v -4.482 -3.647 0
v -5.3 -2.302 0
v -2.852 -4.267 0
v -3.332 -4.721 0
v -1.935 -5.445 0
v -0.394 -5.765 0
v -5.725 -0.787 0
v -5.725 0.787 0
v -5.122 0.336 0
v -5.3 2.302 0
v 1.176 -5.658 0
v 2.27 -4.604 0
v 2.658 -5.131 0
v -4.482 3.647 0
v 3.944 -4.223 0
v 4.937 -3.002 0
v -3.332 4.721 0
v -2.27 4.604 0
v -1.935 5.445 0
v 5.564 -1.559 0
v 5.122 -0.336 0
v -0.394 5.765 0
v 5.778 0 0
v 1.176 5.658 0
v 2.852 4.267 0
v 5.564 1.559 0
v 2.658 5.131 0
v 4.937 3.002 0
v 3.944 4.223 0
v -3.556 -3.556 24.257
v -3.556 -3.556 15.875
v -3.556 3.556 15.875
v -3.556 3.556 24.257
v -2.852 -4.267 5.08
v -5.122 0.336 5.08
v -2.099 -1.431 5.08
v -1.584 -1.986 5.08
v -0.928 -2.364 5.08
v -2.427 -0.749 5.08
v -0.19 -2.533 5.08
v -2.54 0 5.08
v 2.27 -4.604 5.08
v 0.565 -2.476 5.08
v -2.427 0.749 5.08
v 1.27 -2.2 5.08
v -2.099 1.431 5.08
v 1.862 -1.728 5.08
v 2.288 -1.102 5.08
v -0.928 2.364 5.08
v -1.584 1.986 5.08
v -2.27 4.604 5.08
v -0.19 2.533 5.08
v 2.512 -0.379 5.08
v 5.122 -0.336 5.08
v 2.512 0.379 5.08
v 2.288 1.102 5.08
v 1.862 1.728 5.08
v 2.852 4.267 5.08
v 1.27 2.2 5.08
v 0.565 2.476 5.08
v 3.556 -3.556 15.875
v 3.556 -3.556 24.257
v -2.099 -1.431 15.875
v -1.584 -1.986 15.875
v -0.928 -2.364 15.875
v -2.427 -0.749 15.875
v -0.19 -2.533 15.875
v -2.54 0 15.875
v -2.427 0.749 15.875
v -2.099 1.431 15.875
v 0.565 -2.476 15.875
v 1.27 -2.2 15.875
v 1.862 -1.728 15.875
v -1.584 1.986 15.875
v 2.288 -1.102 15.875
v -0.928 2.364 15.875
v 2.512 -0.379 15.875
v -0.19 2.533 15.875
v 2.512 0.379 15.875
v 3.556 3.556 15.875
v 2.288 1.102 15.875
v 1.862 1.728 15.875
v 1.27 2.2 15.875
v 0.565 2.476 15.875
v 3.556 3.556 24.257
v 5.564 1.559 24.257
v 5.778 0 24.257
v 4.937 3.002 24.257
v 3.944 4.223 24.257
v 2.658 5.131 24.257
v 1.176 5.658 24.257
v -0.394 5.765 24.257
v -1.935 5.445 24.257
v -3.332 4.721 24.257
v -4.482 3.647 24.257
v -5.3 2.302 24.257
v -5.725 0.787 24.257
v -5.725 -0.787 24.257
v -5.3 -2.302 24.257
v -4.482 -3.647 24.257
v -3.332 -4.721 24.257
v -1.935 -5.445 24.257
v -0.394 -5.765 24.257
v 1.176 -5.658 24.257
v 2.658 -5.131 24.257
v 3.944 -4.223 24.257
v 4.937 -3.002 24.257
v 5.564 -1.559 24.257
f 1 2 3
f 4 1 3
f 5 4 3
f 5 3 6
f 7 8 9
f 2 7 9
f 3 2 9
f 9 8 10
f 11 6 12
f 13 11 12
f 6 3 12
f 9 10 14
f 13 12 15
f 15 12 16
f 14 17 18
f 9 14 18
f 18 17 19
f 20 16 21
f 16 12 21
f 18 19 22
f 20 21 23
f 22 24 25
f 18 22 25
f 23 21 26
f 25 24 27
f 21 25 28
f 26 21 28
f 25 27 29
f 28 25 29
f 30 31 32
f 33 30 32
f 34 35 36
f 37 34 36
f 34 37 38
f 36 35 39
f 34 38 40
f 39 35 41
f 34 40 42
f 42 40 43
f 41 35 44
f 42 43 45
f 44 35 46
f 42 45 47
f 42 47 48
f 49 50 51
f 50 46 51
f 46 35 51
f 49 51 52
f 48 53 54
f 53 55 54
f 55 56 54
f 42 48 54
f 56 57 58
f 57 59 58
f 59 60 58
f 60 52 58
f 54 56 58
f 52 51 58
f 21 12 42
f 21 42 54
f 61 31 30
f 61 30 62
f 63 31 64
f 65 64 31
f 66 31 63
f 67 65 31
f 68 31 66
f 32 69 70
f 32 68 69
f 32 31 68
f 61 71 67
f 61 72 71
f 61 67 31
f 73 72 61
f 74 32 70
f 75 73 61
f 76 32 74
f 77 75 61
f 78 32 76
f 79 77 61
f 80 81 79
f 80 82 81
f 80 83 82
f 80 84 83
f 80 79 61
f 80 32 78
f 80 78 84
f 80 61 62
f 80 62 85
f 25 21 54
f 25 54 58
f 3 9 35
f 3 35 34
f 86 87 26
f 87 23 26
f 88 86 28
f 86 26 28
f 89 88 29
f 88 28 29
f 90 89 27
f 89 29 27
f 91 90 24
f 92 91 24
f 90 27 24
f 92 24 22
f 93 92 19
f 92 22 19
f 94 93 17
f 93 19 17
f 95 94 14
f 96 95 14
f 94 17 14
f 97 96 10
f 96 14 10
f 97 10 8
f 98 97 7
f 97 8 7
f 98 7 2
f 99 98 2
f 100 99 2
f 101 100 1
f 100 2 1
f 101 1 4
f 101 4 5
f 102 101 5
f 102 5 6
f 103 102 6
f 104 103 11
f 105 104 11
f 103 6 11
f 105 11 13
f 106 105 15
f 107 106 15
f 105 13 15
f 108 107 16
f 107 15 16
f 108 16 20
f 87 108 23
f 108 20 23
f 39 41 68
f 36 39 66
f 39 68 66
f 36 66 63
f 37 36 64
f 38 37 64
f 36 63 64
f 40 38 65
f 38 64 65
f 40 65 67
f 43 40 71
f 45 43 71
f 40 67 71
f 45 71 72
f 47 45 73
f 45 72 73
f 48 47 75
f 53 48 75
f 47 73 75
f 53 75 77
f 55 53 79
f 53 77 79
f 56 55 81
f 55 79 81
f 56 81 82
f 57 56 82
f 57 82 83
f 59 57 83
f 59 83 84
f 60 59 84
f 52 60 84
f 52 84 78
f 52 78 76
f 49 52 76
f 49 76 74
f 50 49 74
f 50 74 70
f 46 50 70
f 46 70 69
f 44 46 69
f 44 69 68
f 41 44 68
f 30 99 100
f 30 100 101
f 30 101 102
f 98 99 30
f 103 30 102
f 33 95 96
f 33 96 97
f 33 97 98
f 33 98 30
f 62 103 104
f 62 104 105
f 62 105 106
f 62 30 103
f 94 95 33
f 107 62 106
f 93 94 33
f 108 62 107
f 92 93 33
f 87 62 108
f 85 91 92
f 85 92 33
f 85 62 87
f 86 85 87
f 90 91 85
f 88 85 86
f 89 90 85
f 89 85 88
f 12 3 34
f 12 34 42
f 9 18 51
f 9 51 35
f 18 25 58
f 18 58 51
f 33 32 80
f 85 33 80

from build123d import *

# Parameters (mm, degrees)
F0_R     = 5.7785
F1_DEPTH = 15.875
F2_DEPTH = 5.08
F3_D     = 5.08
F5_R     = 5.7785
F5_W     = 7.112
F5_H     = 7.112
F6_DEPTH = 8.382


with BuildPart() as f1:
    # F0 (on Top) → F1 (new body)
    with BuildSketch(Plane.XY):
        Circle(F0_R)
        Polygon((2.851977, 4.267348), (5.12162, -0.336211), (2.269643, -4.603559), (-2.851977, -4.267348), (-5.12162, 0.336211), (-2.269643, 4.603559), align=None, mode=Mode.SUBTRACT)
        Polygon((2.269643, -4.603559), (5.12162, -0.336211), (2.851977, 4.267348), (-2.269643, 4.603559), (-5.12162, 0.336211), (-2.851977, -4.267348), align=None)
    extrude(amount=F1_DEPTH)

    # F0 (on Top) → F2 (cut)
    with BuildSketch(Plane.XY):
        Polygon((2.269643, -4.603559), (5.12162, -0.336211), (2.851977, 4.267348), (-2.269643, 4.603559), (-5.12162, 0.336211), (-2.851977, -4.267348), align=None)
    extrude(amount=F2_DEPTH, mode=Mode.SUBTRACT)

    # F3 (through all)
    with Locations(Plane(origin=(0, 0, 0), x_dir=(1, 0, 0), z_dir=(0, 0, -1))):
        with Locations((0, 0)):
            Hole(F3_D / 2)

    # F5 (on face) → F6 (join)
    with BuildSketch(Plane.XY.offset(15.875)):
        Circle(F5_R)
        Rectangle(F5_W, F5_H, mode=Mode.SUBTRACT)
    extrude(amount=F6_DEPTH)


solid = f1.part
